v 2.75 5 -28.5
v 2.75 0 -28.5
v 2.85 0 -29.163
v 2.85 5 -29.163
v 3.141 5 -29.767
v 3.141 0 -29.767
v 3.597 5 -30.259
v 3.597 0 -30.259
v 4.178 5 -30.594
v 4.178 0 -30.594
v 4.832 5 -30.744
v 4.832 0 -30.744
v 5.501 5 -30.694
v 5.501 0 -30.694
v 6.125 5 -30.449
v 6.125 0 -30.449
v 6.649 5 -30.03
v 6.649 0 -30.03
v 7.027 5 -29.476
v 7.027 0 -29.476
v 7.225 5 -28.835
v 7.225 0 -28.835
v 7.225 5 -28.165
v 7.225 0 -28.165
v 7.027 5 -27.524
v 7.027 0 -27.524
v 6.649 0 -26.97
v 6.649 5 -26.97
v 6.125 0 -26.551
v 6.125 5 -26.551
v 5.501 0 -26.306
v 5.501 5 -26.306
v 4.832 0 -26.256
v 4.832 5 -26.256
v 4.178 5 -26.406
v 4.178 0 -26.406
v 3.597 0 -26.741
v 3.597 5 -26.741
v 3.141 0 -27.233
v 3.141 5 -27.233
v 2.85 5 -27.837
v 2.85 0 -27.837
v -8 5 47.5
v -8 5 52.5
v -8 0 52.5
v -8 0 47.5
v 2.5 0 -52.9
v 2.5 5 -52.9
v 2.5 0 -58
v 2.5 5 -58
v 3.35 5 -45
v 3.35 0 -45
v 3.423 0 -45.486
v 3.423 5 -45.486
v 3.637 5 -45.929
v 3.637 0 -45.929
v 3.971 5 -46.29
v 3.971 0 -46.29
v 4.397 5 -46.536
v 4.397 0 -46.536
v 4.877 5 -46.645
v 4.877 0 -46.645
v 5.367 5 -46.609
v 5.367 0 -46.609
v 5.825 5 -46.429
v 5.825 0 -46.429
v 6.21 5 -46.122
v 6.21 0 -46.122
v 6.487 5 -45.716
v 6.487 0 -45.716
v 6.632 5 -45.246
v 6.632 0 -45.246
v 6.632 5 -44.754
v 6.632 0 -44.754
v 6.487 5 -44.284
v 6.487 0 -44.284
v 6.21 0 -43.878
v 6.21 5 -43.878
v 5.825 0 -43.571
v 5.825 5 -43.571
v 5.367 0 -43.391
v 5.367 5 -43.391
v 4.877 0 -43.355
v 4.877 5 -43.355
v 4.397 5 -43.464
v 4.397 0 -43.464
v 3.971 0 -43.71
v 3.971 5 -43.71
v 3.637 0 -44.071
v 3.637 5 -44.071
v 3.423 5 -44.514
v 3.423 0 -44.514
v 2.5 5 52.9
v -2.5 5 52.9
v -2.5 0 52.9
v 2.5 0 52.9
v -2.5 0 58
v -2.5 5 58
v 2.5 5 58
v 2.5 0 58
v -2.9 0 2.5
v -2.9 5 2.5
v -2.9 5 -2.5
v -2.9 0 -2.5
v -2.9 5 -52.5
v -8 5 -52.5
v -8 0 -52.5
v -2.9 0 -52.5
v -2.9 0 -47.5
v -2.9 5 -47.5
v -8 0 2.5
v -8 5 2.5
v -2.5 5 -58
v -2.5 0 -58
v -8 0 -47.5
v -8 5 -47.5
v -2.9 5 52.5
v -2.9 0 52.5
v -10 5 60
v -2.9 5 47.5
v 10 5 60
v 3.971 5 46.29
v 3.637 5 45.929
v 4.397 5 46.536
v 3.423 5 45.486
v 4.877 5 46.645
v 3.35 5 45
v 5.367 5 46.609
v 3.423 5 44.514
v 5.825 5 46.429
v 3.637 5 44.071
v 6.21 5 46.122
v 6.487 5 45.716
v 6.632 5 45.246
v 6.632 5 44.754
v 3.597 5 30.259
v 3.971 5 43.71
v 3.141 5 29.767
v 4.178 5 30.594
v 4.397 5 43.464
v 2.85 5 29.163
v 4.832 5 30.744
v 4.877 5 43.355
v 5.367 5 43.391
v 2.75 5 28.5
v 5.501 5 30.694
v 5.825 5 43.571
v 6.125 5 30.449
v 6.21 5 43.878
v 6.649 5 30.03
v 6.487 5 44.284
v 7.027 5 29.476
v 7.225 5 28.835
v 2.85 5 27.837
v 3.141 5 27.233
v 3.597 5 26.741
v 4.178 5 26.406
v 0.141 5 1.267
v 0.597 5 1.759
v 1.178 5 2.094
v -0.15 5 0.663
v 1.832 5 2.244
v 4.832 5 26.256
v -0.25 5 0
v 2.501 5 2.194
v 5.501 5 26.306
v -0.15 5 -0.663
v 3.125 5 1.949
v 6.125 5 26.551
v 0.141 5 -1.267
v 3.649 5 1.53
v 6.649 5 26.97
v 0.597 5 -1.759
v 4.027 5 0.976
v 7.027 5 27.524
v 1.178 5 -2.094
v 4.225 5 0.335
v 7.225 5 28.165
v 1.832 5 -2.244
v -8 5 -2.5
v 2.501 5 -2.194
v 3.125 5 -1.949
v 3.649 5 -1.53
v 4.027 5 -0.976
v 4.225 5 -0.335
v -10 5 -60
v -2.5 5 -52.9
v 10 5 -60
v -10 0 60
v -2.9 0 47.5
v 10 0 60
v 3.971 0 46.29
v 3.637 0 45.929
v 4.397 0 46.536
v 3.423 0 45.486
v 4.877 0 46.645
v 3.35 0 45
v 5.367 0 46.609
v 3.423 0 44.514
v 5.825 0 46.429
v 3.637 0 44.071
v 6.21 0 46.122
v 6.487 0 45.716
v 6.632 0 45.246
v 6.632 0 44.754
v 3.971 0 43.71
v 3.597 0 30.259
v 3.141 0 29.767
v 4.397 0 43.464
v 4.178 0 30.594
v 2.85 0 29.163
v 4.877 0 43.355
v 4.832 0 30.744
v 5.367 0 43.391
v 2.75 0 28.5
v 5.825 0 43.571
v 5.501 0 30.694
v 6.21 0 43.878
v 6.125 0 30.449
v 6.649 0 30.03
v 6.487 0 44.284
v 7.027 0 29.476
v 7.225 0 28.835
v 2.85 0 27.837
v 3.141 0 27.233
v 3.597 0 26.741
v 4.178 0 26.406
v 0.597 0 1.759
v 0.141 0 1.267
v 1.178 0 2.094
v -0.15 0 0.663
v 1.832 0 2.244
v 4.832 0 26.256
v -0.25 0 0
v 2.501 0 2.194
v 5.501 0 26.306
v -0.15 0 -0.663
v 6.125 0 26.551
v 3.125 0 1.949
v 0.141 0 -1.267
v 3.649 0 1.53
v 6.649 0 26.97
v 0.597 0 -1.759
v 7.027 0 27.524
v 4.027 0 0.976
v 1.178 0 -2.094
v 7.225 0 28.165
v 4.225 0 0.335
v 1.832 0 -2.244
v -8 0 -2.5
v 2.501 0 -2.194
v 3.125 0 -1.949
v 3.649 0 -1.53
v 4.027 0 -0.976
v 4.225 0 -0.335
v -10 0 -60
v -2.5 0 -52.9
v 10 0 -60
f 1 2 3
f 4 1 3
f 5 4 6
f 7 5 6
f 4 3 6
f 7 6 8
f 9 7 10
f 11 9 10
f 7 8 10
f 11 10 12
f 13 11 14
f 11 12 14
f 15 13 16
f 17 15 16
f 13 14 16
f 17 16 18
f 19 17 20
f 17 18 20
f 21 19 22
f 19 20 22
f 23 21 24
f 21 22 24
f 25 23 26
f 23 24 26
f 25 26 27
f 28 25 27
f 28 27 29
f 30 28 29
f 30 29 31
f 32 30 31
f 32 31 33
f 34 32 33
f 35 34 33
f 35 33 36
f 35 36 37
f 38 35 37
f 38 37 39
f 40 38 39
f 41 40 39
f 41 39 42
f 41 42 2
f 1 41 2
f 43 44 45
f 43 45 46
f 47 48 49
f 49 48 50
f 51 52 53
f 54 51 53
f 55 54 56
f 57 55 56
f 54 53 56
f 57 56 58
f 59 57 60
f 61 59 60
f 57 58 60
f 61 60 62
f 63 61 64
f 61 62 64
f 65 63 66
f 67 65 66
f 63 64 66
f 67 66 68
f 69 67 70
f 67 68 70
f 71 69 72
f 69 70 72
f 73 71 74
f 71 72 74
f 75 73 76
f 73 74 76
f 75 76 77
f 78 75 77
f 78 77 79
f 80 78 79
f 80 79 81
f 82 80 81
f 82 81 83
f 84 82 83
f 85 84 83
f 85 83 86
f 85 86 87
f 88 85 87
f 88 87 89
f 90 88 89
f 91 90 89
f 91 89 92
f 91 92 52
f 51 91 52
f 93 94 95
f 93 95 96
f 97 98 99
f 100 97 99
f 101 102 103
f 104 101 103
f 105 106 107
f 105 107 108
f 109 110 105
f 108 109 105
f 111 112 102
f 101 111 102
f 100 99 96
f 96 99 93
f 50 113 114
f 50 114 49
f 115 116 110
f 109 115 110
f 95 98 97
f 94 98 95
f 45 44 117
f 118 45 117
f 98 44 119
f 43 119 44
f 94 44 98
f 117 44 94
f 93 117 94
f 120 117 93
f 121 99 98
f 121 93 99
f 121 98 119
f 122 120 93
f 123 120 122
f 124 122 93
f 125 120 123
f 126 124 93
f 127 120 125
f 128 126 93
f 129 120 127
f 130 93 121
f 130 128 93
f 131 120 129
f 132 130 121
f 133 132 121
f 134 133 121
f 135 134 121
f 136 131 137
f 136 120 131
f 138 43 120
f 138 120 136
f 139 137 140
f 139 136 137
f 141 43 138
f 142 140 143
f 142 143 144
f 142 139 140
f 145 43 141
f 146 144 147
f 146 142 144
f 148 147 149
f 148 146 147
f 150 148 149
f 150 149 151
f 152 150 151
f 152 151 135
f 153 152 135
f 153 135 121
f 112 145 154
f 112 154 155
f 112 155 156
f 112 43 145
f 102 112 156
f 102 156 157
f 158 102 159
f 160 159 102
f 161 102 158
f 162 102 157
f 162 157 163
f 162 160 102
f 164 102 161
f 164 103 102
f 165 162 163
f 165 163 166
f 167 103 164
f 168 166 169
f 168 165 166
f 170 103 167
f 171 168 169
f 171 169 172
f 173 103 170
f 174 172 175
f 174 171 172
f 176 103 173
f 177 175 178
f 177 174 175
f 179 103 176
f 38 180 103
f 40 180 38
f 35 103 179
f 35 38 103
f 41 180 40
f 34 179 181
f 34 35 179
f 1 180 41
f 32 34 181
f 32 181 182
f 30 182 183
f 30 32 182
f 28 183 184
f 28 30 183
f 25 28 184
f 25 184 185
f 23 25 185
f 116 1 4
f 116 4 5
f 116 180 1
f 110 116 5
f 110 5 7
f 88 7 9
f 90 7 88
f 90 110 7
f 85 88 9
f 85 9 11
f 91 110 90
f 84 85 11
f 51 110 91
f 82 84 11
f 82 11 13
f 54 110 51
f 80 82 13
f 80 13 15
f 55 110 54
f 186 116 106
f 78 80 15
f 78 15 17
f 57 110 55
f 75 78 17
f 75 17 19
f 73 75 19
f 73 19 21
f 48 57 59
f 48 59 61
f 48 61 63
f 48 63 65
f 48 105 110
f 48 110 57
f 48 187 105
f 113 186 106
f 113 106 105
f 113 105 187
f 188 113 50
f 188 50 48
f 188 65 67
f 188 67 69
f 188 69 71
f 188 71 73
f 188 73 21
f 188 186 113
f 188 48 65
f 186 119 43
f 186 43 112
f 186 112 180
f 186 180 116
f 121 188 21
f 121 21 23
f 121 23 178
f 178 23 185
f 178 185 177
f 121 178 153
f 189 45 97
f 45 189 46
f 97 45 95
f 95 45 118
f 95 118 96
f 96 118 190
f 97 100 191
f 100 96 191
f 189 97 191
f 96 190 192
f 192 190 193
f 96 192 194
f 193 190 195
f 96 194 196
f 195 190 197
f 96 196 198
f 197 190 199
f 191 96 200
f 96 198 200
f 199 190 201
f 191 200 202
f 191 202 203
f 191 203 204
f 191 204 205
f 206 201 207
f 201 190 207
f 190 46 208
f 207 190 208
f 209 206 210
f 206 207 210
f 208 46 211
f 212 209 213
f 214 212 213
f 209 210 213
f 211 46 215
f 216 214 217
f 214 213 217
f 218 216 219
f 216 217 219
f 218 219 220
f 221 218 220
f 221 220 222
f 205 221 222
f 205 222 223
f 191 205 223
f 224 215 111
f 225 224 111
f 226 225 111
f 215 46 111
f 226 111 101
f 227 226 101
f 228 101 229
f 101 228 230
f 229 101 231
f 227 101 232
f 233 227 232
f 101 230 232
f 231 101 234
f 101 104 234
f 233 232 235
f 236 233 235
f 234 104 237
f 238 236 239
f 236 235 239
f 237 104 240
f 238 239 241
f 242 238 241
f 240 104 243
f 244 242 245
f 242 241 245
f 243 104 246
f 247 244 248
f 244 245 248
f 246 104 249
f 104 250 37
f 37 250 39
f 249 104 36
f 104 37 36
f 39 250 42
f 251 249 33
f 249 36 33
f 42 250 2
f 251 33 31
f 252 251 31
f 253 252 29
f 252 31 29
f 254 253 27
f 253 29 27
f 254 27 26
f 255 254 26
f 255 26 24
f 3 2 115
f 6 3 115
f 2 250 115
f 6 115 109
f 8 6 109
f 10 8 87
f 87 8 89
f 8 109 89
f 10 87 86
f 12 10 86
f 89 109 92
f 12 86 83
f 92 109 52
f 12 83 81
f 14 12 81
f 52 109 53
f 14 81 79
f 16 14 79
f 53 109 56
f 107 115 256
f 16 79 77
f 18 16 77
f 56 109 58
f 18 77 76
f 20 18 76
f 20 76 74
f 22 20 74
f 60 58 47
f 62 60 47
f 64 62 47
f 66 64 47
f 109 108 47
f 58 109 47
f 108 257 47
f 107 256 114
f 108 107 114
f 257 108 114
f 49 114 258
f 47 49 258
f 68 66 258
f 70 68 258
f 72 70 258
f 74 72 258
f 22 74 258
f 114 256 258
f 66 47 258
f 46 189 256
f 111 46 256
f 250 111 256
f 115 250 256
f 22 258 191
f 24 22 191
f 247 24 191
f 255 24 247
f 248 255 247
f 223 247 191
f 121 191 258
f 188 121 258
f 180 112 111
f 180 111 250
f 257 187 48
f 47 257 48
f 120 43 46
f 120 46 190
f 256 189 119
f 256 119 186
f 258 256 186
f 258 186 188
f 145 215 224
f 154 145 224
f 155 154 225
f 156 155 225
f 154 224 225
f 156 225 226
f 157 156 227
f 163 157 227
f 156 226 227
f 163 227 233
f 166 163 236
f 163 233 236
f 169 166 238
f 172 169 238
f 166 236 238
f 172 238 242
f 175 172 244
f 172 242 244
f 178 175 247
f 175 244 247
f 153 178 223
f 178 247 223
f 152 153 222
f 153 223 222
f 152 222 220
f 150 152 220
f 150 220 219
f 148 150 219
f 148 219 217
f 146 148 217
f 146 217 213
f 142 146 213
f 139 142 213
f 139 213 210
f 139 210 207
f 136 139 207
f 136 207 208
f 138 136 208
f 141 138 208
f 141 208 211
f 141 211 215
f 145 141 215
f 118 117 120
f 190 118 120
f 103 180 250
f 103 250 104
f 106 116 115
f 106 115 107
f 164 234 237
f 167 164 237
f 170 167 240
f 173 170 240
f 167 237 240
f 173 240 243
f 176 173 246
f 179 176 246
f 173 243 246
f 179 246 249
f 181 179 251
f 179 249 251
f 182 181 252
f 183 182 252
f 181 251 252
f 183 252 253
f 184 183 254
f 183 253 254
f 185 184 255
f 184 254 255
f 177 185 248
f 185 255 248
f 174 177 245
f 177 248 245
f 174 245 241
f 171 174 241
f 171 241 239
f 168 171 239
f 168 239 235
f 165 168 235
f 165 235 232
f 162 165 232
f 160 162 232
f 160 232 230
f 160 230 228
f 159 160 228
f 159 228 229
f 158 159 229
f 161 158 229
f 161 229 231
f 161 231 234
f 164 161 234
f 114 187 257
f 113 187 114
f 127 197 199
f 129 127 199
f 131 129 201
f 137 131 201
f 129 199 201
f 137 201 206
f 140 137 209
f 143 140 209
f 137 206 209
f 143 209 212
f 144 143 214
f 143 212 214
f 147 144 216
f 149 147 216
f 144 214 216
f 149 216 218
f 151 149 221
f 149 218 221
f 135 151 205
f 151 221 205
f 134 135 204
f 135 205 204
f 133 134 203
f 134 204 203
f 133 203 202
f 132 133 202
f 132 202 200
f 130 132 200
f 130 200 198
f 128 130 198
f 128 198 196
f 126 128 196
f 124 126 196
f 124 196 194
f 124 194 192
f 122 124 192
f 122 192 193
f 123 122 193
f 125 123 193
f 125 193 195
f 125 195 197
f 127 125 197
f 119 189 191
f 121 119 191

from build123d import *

# Parameters (mm, degrees)
SKETCH1_W                  = 20
SKETCH1_H                  = 120
BOSS_EXTRUDE1_DEPTH        = 5
F_3_3_3_3_DIAMETER_HOLE1_D = 3.3
SKETCH5_W                  = 5.1
SKETCH5_H                  = 5
SKETCH5_W_2                = 5
SKETCH5_H_2                = 5.1
CUT_EXTRUDE1_DEPTH         = 6
F_4_5_4_5_DIAMETER_HOLE2_D = 4.5


with BuildPart() as part:
    # Sketch1 → Boss-Extrude1 (new body)
    with BuildSketch(Plane(origin=(0, 0, 0), x_dir=(1, 0, 0), z_dir=(0, 1, 0))):
        Rectangle(SKETCH1_W, SKETCH1_H)
    extrude(amount=BOSS_EXTRUDE1_DEPTH)

    # Ø3.3 (3.3) Diameter Hole1 (through all)
    with Locations(Plane(origin=(0, 5, 0), x_dir=(1, 0, 0), z_dir=(0, 1, 0))):
        with Locations((5, 45), (5, -45)):
            Hole(F_3_3_3_3_DIAMETER_HOLE1_D / 2)

    # Sketch5 → Cut-Extrude1 (cut, through all)
    with BuildSketch(Plane(origin=(0, 5, 0), x_dir=(1, 0, 0), z_dir=(0, 1, 0))):
        with Locations((-5.45, 50)):
            Rectangle(SKETCH5_W, SKETCH5_H)
        with Locations((-5.45, -50)):
            Rectangle(SKETCH5_W, SKETCH5_H)
        with Locations((0, -55.45)):
            Rectangle(SKETCH5_W_2, SKETCH5_H_2)
        with Locations((0, 55.45)):
            Rectangle(SKETCH5_W_2, SKETCH5_H_2)
        with Locations((-5.45, 0)):
            Rectangle(SKETCH5_W, SKETCH5_H)
    extrude(amount=-CUT_EXTRUDE1_DEPTH, mode=Mode.SUBTRACT)

    # Ø4.5 (4.5) Diameter Hole2 (through all)
    with Locations(Plane(origin=(0, 5, 0), x_dir=(1, 0, 0), z_dir=(0, 1, 0))):
        with Locations((5, 28.5), (2, 0), (5, -28.5)):
            Hole(F_4_5_4_5_DIAMETER_HOLE2_D / 2)


solid = part.part
